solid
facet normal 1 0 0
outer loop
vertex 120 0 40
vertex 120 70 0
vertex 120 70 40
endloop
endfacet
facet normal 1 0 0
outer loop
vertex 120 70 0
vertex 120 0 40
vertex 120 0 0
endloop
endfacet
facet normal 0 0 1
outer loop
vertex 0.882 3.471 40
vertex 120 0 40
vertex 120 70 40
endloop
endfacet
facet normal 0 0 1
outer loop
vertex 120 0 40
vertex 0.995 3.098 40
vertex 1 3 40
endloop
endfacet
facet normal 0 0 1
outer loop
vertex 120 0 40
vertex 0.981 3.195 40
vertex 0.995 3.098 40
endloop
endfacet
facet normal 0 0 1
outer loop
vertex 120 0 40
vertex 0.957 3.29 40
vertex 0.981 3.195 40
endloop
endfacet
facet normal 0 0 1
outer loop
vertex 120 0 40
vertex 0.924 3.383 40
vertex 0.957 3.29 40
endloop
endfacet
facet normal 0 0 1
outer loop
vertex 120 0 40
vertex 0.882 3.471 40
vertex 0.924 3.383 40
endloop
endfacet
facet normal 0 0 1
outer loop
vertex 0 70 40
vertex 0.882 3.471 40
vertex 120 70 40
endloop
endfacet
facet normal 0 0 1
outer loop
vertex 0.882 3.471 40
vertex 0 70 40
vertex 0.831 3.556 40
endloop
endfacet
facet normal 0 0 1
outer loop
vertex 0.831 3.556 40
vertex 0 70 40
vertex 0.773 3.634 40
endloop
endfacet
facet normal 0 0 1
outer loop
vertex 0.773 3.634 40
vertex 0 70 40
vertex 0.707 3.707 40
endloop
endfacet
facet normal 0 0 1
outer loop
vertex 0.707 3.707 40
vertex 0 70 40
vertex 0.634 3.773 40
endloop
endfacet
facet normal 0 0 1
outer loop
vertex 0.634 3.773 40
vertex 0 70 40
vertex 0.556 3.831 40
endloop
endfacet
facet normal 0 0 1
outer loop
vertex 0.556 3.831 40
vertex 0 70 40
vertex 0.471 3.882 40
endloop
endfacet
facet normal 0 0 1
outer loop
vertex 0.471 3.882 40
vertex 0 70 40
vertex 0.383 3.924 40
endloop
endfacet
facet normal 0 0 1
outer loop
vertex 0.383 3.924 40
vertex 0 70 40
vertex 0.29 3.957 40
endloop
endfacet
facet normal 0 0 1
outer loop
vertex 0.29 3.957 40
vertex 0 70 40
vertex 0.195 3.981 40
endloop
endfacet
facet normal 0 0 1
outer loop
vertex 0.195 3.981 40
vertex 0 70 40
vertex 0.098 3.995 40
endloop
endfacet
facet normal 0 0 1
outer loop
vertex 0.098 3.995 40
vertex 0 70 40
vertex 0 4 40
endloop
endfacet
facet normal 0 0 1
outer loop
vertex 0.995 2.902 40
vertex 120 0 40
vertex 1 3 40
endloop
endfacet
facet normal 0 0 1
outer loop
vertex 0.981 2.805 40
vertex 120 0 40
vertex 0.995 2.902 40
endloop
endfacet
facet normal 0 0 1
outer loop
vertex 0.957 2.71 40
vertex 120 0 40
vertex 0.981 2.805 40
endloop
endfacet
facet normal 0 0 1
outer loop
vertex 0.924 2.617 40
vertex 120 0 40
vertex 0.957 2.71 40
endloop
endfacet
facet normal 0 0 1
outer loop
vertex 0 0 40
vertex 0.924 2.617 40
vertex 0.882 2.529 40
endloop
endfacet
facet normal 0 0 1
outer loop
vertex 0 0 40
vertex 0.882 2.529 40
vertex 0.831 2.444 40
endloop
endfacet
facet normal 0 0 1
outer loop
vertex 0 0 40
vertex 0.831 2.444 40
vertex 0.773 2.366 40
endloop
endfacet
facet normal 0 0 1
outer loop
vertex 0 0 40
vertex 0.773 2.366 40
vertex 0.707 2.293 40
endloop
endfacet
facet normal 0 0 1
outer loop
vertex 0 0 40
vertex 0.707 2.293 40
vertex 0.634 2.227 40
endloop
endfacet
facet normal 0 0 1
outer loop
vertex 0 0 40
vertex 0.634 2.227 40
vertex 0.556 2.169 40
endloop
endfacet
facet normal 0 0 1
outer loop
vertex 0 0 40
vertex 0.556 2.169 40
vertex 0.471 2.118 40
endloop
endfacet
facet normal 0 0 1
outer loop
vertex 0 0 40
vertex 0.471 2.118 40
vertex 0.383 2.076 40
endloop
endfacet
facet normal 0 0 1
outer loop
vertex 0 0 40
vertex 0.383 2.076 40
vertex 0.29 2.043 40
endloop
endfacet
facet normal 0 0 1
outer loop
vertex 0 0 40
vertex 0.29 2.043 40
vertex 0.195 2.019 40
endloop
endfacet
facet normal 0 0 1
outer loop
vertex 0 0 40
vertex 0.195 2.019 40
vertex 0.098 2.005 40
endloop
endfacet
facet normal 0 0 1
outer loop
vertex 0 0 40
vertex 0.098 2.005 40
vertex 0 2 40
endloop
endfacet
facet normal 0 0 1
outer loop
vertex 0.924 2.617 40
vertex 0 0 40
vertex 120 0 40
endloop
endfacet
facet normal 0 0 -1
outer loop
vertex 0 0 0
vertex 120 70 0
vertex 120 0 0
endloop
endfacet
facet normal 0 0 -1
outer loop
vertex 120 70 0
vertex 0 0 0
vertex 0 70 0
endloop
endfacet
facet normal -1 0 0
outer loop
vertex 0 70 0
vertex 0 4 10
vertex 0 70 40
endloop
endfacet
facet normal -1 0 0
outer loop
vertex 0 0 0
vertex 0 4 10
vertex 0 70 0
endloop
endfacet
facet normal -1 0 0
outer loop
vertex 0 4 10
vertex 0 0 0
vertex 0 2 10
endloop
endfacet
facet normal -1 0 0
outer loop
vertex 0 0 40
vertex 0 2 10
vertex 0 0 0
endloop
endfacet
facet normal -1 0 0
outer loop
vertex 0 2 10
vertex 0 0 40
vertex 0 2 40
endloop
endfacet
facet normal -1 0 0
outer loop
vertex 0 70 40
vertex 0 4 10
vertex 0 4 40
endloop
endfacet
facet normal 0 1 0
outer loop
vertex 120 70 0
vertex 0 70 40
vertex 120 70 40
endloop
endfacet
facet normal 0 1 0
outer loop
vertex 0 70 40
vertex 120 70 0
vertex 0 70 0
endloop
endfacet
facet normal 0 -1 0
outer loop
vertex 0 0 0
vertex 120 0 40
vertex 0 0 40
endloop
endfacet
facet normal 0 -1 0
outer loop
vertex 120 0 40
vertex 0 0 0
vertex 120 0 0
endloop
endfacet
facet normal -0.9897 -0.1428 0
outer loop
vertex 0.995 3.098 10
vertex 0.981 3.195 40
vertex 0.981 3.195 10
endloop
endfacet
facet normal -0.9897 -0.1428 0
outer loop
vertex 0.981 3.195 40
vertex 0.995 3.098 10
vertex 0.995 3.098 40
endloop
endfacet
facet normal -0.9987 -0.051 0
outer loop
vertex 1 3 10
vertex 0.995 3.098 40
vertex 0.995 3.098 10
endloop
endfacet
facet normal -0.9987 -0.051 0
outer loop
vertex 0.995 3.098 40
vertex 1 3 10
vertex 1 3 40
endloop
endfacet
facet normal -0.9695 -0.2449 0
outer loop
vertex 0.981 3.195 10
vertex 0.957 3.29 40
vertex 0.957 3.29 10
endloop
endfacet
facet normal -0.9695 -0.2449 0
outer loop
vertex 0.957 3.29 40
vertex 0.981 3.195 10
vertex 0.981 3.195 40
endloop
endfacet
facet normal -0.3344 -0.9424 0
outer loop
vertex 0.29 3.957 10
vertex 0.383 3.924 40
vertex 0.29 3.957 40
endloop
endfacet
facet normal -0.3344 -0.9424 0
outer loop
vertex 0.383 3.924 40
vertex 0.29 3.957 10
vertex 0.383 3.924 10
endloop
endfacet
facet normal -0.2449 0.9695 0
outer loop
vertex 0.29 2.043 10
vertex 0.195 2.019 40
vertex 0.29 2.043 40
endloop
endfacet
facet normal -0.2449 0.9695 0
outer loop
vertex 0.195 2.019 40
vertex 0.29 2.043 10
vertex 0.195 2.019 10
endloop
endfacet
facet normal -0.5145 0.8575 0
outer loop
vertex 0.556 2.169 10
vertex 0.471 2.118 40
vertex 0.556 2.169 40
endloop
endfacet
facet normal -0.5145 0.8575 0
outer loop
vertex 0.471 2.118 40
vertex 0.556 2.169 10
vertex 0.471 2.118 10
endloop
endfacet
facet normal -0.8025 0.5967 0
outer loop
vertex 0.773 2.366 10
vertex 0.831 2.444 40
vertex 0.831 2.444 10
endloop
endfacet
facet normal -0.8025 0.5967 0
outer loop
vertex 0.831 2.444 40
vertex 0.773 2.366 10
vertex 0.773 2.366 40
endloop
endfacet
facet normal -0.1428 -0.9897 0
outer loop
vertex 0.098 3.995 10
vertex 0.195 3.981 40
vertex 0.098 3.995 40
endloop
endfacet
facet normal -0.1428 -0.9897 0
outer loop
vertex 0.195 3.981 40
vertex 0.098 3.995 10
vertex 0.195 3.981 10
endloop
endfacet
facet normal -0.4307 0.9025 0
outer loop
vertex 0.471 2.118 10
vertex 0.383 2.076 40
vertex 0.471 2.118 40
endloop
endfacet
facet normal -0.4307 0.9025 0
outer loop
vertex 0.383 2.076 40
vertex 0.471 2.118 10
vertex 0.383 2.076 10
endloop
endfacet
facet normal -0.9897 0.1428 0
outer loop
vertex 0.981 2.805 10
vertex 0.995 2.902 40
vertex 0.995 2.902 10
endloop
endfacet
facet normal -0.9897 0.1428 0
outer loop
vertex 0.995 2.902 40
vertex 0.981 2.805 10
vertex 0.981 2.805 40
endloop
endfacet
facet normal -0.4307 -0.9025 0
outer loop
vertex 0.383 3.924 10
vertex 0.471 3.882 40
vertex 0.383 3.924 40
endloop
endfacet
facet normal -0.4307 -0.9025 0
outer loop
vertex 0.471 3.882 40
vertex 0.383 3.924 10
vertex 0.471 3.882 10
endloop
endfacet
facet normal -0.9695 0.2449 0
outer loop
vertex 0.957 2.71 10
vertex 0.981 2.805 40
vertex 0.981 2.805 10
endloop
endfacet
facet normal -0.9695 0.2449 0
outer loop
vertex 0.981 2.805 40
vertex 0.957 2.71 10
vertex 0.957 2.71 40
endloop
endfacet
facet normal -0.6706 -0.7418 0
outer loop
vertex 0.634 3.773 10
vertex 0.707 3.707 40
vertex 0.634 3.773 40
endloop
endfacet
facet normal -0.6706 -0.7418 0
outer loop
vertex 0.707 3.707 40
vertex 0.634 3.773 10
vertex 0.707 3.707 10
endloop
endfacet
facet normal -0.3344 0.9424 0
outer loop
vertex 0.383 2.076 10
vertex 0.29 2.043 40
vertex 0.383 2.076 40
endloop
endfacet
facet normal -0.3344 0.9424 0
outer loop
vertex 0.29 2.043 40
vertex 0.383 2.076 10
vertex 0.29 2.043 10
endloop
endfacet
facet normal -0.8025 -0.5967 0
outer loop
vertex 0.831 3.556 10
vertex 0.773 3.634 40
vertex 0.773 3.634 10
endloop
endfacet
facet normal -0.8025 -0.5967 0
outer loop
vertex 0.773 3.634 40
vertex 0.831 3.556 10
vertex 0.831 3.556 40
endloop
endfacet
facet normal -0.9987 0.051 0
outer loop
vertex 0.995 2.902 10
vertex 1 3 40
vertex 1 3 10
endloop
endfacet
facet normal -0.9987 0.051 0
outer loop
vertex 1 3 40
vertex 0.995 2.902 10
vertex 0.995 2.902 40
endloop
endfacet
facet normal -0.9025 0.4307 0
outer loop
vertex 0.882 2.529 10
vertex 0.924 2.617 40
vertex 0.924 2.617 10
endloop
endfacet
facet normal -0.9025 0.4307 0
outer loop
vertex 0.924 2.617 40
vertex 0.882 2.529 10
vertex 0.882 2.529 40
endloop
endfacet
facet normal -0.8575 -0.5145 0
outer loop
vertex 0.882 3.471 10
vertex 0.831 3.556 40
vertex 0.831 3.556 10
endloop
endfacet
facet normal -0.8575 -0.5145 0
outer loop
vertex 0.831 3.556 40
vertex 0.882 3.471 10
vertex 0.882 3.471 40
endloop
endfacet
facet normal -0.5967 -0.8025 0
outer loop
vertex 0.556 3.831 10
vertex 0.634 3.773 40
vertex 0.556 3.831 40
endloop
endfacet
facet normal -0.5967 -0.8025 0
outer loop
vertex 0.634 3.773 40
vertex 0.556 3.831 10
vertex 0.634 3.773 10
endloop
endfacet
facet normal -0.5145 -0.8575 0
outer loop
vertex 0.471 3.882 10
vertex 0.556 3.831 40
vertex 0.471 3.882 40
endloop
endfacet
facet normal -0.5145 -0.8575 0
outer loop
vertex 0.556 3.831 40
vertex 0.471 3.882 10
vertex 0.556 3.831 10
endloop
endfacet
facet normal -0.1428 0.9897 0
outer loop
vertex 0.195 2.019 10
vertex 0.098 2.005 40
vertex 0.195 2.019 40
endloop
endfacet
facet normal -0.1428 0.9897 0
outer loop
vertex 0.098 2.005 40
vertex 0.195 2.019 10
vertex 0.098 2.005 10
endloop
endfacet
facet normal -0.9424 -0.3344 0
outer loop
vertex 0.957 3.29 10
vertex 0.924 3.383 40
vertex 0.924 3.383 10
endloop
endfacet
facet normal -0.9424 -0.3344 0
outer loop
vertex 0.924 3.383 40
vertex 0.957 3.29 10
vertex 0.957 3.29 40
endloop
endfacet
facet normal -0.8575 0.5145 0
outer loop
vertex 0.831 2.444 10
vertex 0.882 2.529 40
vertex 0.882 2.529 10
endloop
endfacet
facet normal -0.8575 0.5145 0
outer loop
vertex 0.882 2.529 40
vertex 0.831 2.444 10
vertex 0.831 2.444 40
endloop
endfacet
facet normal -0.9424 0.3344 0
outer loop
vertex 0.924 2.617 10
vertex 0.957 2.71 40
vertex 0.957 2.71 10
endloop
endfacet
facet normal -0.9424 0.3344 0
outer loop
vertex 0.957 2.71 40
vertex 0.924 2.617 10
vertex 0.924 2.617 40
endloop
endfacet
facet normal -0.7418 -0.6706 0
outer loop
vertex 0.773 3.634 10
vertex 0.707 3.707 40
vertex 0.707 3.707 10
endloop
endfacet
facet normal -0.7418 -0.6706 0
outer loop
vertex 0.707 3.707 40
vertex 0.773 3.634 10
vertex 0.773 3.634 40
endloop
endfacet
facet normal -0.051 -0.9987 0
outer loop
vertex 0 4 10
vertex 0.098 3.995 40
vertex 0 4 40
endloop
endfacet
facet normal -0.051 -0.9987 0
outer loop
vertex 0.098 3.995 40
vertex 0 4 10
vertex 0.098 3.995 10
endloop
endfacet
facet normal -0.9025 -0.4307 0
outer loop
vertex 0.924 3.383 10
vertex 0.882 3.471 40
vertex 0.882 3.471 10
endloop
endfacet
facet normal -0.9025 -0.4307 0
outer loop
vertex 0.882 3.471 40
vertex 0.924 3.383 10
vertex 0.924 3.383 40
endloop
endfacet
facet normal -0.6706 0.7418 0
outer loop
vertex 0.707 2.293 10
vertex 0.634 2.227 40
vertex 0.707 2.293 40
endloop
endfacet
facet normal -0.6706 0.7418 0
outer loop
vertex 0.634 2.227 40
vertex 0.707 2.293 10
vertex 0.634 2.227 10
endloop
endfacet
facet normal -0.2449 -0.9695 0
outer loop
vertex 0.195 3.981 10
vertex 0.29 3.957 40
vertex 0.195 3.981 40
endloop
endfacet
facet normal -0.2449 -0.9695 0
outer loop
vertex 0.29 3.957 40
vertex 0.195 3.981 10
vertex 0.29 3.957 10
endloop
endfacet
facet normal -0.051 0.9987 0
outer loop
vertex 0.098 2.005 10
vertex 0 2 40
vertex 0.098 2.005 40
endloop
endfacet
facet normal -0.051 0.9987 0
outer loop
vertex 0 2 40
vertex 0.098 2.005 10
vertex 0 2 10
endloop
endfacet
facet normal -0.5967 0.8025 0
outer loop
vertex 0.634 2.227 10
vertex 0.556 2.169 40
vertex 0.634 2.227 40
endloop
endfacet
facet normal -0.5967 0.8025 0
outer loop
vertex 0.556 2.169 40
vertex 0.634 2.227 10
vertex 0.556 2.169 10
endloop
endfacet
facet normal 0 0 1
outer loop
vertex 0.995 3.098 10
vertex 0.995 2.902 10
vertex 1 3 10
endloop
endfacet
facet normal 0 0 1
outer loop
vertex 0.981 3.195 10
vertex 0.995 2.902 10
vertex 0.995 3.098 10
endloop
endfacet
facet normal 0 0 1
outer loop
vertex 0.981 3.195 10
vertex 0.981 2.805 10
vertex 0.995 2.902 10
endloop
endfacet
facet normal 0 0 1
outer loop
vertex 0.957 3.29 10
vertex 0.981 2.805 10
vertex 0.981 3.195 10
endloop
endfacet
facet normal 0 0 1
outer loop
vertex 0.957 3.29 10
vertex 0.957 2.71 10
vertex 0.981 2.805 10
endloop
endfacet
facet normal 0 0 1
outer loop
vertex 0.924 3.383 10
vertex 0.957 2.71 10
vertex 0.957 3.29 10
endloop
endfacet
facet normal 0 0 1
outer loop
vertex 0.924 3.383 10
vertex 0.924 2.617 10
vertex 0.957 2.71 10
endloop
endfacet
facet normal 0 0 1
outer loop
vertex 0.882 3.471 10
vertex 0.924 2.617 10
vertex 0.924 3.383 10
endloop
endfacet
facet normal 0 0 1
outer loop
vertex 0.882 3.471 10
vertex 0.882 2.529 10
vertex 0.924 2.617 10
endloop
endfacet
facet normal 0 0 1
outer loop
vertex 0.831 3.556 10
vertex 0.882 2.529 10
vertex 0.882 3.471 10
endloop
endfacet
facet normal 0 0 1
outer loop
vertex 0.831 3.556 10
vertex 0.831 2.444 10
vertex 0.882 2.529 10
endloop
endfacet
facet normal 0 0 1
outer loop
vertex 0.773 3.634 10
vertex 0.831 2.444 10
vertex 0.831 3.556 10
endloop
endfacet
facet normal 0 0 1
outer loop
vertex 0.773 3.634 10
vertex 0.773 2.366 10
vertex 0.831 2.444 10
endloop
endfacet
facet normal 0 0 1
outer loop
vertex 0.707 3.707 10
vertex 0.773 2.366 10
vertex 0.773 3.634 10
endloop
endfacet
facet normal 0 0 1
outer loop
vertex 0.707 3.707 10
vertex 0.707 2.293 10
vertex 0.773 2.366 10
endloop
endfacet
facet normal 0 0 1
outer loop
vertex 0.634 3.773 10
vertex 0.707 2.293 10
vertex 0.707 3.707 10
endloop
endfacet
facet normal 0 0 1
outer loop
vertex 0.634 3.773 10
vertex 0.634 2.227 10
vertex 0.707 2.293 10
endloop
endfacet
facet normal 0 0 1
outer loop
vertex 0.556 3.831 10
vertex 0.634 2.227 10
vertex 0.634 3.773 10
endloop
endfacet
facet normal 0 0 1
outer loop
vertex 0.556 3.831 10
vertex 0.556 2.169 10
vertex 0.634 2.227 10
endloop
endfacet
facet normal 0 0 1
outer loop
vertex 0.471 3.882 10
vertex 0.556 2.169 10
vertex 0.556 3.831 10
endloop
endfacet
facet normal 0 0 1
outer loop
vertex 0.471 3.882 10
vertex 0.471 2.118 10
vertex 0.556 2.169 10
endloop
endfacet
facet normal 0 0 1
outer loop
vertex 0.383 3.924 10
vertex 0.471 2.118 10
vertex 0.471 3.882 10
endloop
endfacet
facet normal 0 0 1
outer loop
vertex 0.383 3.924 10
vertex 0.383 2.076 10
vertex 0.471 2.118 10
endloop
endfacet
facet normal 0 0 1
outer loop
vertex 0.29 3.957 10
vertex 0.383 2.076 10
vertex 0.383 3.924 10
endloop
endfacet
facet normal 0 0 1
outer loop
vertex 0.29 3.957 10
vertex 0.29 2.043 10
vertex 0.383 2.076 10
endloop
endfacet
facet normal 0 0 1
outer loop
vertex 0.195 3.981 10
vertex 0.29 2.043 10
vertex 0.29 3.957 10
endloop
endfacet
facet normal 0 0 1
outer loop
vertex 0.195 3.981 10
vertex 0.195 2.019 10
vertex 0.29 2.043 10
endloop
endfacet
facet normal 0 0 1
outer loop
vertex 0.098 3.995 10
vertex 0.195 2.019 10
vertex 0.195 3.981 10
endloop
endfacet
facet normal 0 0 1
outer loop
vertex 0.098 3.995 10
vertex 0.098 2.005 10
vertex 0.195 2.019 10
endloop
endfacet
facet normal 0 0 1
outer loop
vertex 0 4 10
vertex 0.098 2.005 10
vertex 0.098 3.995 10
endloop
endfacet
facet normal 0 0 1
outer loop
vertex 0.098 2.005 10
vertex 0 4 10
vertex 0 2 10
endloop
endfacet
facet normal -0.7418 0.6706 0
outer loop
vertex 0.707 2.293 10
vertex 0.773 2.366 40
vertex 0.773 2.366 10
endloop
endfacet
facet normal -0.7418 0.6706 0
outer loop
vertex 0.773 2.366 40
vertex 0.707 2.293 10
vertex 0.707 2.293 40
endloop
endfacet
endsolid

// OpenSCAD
// Mini Horizontal Gel Electrophoresis Buffer Tank
// Outer dimensions: 120 (X) x 70 (Y) x 40 (Z)
// Wall thickness: 3 mm
// Floor thickness: 3 mm
// Inner platform: 60 (X) x 70 (Y) x 10 (height from inner floor)
// Electrode holes: 2 mm diameter, horizontal along X, at Y=0, Z=30 (outer coords)

$fn = 64;

// --- Dimensions ---
X_out = 120;
Y_out = 70;
Z_out = 40;
wall  = 3;
floor = 3;

// --- Calculated Inner Dimensions ---
X_in  = X_out - 2 * wall;
Y_in  = Y_out - 2 * wall;
Z_in  = Z_out - floor; // Inner floor is at Z = floor

// --- Platform Dimensions ---
plat_len = 60;
plat_w   = Y_in;     // Spans full inner width
plat_h   = 10;       // Height above inner floor
plat_z   = floor + plat_h; // Absolute Z position of platform top

// --- Electrode Hole Dimensions ---
hole_d   = 2;
hole_y   = wall;     // Y position (center of wall thickness)
hole_z   = Z_out - 30; // Z position (30mm from bottom, so 10mm from top)

// --- Helper: Create the main tank body ---
module tank_body() {
    // Outer box
    translate([0, 0, 0]) cube([X_out, Y_out, Z_out]);
    
    // Cut out the inner volume (air space)
    // Inner box starts at wall, goes to X_in, Y_in, Z_in
    translate([wall, wall, floor]) cube([X_in, Y_in, Z_in]);
}

// --- Helper: Create the raised platform ---
module platform() {
    // Platform sits on the inner floor.
    // Bottom of platform is at Z = floor.
    // Top of platform is at Z = floor + plat_h.
    // It spans the full inner width (Y_in) and is centered in X.
    
    translate([
        (X_out - plat_len) / 2, 
        wall, 
        floor
    ]) cube([plat_len, plat_w, plat_h]);
}

// --- Helper: Create the electrode hole ---
// The hole is horizontal along X.
// It passes through the end walls at Y = wall and Y = Y_out - wall.
// The center of the hole is at Y = hole_y, Z = hole_z.
// We need to cut a cylinder of diameter hole_d, length X_out, 
// centered at the specific Y and Z.
module electrode_hole() {
    // Cylinder axis is X.
    // Center of cylinder:
    // X: 0 (centered)
    // Y: hole_y
    // Z: hole_z
    translate([0, hole_y, hole_z]) cylinder(h = X_out, d = hole_d);
}

// --- Main Assembly ---
difference() {
    union() {
        tank_body();
        platform();
    }
    
    // Cut the electrode holes
    // We need to cut through the end walls.
    // The hole is defined as a cylinder along X.
    // Since we are in a difference(), this cylinder will cut through the tank.
    // We must ensure the cylinder extends slightly past the tank faces to ensure clean cuts.
    translate([0, hole_y, hole_z]) cylinder(h = X_out + 2, d = hole_d);
}
